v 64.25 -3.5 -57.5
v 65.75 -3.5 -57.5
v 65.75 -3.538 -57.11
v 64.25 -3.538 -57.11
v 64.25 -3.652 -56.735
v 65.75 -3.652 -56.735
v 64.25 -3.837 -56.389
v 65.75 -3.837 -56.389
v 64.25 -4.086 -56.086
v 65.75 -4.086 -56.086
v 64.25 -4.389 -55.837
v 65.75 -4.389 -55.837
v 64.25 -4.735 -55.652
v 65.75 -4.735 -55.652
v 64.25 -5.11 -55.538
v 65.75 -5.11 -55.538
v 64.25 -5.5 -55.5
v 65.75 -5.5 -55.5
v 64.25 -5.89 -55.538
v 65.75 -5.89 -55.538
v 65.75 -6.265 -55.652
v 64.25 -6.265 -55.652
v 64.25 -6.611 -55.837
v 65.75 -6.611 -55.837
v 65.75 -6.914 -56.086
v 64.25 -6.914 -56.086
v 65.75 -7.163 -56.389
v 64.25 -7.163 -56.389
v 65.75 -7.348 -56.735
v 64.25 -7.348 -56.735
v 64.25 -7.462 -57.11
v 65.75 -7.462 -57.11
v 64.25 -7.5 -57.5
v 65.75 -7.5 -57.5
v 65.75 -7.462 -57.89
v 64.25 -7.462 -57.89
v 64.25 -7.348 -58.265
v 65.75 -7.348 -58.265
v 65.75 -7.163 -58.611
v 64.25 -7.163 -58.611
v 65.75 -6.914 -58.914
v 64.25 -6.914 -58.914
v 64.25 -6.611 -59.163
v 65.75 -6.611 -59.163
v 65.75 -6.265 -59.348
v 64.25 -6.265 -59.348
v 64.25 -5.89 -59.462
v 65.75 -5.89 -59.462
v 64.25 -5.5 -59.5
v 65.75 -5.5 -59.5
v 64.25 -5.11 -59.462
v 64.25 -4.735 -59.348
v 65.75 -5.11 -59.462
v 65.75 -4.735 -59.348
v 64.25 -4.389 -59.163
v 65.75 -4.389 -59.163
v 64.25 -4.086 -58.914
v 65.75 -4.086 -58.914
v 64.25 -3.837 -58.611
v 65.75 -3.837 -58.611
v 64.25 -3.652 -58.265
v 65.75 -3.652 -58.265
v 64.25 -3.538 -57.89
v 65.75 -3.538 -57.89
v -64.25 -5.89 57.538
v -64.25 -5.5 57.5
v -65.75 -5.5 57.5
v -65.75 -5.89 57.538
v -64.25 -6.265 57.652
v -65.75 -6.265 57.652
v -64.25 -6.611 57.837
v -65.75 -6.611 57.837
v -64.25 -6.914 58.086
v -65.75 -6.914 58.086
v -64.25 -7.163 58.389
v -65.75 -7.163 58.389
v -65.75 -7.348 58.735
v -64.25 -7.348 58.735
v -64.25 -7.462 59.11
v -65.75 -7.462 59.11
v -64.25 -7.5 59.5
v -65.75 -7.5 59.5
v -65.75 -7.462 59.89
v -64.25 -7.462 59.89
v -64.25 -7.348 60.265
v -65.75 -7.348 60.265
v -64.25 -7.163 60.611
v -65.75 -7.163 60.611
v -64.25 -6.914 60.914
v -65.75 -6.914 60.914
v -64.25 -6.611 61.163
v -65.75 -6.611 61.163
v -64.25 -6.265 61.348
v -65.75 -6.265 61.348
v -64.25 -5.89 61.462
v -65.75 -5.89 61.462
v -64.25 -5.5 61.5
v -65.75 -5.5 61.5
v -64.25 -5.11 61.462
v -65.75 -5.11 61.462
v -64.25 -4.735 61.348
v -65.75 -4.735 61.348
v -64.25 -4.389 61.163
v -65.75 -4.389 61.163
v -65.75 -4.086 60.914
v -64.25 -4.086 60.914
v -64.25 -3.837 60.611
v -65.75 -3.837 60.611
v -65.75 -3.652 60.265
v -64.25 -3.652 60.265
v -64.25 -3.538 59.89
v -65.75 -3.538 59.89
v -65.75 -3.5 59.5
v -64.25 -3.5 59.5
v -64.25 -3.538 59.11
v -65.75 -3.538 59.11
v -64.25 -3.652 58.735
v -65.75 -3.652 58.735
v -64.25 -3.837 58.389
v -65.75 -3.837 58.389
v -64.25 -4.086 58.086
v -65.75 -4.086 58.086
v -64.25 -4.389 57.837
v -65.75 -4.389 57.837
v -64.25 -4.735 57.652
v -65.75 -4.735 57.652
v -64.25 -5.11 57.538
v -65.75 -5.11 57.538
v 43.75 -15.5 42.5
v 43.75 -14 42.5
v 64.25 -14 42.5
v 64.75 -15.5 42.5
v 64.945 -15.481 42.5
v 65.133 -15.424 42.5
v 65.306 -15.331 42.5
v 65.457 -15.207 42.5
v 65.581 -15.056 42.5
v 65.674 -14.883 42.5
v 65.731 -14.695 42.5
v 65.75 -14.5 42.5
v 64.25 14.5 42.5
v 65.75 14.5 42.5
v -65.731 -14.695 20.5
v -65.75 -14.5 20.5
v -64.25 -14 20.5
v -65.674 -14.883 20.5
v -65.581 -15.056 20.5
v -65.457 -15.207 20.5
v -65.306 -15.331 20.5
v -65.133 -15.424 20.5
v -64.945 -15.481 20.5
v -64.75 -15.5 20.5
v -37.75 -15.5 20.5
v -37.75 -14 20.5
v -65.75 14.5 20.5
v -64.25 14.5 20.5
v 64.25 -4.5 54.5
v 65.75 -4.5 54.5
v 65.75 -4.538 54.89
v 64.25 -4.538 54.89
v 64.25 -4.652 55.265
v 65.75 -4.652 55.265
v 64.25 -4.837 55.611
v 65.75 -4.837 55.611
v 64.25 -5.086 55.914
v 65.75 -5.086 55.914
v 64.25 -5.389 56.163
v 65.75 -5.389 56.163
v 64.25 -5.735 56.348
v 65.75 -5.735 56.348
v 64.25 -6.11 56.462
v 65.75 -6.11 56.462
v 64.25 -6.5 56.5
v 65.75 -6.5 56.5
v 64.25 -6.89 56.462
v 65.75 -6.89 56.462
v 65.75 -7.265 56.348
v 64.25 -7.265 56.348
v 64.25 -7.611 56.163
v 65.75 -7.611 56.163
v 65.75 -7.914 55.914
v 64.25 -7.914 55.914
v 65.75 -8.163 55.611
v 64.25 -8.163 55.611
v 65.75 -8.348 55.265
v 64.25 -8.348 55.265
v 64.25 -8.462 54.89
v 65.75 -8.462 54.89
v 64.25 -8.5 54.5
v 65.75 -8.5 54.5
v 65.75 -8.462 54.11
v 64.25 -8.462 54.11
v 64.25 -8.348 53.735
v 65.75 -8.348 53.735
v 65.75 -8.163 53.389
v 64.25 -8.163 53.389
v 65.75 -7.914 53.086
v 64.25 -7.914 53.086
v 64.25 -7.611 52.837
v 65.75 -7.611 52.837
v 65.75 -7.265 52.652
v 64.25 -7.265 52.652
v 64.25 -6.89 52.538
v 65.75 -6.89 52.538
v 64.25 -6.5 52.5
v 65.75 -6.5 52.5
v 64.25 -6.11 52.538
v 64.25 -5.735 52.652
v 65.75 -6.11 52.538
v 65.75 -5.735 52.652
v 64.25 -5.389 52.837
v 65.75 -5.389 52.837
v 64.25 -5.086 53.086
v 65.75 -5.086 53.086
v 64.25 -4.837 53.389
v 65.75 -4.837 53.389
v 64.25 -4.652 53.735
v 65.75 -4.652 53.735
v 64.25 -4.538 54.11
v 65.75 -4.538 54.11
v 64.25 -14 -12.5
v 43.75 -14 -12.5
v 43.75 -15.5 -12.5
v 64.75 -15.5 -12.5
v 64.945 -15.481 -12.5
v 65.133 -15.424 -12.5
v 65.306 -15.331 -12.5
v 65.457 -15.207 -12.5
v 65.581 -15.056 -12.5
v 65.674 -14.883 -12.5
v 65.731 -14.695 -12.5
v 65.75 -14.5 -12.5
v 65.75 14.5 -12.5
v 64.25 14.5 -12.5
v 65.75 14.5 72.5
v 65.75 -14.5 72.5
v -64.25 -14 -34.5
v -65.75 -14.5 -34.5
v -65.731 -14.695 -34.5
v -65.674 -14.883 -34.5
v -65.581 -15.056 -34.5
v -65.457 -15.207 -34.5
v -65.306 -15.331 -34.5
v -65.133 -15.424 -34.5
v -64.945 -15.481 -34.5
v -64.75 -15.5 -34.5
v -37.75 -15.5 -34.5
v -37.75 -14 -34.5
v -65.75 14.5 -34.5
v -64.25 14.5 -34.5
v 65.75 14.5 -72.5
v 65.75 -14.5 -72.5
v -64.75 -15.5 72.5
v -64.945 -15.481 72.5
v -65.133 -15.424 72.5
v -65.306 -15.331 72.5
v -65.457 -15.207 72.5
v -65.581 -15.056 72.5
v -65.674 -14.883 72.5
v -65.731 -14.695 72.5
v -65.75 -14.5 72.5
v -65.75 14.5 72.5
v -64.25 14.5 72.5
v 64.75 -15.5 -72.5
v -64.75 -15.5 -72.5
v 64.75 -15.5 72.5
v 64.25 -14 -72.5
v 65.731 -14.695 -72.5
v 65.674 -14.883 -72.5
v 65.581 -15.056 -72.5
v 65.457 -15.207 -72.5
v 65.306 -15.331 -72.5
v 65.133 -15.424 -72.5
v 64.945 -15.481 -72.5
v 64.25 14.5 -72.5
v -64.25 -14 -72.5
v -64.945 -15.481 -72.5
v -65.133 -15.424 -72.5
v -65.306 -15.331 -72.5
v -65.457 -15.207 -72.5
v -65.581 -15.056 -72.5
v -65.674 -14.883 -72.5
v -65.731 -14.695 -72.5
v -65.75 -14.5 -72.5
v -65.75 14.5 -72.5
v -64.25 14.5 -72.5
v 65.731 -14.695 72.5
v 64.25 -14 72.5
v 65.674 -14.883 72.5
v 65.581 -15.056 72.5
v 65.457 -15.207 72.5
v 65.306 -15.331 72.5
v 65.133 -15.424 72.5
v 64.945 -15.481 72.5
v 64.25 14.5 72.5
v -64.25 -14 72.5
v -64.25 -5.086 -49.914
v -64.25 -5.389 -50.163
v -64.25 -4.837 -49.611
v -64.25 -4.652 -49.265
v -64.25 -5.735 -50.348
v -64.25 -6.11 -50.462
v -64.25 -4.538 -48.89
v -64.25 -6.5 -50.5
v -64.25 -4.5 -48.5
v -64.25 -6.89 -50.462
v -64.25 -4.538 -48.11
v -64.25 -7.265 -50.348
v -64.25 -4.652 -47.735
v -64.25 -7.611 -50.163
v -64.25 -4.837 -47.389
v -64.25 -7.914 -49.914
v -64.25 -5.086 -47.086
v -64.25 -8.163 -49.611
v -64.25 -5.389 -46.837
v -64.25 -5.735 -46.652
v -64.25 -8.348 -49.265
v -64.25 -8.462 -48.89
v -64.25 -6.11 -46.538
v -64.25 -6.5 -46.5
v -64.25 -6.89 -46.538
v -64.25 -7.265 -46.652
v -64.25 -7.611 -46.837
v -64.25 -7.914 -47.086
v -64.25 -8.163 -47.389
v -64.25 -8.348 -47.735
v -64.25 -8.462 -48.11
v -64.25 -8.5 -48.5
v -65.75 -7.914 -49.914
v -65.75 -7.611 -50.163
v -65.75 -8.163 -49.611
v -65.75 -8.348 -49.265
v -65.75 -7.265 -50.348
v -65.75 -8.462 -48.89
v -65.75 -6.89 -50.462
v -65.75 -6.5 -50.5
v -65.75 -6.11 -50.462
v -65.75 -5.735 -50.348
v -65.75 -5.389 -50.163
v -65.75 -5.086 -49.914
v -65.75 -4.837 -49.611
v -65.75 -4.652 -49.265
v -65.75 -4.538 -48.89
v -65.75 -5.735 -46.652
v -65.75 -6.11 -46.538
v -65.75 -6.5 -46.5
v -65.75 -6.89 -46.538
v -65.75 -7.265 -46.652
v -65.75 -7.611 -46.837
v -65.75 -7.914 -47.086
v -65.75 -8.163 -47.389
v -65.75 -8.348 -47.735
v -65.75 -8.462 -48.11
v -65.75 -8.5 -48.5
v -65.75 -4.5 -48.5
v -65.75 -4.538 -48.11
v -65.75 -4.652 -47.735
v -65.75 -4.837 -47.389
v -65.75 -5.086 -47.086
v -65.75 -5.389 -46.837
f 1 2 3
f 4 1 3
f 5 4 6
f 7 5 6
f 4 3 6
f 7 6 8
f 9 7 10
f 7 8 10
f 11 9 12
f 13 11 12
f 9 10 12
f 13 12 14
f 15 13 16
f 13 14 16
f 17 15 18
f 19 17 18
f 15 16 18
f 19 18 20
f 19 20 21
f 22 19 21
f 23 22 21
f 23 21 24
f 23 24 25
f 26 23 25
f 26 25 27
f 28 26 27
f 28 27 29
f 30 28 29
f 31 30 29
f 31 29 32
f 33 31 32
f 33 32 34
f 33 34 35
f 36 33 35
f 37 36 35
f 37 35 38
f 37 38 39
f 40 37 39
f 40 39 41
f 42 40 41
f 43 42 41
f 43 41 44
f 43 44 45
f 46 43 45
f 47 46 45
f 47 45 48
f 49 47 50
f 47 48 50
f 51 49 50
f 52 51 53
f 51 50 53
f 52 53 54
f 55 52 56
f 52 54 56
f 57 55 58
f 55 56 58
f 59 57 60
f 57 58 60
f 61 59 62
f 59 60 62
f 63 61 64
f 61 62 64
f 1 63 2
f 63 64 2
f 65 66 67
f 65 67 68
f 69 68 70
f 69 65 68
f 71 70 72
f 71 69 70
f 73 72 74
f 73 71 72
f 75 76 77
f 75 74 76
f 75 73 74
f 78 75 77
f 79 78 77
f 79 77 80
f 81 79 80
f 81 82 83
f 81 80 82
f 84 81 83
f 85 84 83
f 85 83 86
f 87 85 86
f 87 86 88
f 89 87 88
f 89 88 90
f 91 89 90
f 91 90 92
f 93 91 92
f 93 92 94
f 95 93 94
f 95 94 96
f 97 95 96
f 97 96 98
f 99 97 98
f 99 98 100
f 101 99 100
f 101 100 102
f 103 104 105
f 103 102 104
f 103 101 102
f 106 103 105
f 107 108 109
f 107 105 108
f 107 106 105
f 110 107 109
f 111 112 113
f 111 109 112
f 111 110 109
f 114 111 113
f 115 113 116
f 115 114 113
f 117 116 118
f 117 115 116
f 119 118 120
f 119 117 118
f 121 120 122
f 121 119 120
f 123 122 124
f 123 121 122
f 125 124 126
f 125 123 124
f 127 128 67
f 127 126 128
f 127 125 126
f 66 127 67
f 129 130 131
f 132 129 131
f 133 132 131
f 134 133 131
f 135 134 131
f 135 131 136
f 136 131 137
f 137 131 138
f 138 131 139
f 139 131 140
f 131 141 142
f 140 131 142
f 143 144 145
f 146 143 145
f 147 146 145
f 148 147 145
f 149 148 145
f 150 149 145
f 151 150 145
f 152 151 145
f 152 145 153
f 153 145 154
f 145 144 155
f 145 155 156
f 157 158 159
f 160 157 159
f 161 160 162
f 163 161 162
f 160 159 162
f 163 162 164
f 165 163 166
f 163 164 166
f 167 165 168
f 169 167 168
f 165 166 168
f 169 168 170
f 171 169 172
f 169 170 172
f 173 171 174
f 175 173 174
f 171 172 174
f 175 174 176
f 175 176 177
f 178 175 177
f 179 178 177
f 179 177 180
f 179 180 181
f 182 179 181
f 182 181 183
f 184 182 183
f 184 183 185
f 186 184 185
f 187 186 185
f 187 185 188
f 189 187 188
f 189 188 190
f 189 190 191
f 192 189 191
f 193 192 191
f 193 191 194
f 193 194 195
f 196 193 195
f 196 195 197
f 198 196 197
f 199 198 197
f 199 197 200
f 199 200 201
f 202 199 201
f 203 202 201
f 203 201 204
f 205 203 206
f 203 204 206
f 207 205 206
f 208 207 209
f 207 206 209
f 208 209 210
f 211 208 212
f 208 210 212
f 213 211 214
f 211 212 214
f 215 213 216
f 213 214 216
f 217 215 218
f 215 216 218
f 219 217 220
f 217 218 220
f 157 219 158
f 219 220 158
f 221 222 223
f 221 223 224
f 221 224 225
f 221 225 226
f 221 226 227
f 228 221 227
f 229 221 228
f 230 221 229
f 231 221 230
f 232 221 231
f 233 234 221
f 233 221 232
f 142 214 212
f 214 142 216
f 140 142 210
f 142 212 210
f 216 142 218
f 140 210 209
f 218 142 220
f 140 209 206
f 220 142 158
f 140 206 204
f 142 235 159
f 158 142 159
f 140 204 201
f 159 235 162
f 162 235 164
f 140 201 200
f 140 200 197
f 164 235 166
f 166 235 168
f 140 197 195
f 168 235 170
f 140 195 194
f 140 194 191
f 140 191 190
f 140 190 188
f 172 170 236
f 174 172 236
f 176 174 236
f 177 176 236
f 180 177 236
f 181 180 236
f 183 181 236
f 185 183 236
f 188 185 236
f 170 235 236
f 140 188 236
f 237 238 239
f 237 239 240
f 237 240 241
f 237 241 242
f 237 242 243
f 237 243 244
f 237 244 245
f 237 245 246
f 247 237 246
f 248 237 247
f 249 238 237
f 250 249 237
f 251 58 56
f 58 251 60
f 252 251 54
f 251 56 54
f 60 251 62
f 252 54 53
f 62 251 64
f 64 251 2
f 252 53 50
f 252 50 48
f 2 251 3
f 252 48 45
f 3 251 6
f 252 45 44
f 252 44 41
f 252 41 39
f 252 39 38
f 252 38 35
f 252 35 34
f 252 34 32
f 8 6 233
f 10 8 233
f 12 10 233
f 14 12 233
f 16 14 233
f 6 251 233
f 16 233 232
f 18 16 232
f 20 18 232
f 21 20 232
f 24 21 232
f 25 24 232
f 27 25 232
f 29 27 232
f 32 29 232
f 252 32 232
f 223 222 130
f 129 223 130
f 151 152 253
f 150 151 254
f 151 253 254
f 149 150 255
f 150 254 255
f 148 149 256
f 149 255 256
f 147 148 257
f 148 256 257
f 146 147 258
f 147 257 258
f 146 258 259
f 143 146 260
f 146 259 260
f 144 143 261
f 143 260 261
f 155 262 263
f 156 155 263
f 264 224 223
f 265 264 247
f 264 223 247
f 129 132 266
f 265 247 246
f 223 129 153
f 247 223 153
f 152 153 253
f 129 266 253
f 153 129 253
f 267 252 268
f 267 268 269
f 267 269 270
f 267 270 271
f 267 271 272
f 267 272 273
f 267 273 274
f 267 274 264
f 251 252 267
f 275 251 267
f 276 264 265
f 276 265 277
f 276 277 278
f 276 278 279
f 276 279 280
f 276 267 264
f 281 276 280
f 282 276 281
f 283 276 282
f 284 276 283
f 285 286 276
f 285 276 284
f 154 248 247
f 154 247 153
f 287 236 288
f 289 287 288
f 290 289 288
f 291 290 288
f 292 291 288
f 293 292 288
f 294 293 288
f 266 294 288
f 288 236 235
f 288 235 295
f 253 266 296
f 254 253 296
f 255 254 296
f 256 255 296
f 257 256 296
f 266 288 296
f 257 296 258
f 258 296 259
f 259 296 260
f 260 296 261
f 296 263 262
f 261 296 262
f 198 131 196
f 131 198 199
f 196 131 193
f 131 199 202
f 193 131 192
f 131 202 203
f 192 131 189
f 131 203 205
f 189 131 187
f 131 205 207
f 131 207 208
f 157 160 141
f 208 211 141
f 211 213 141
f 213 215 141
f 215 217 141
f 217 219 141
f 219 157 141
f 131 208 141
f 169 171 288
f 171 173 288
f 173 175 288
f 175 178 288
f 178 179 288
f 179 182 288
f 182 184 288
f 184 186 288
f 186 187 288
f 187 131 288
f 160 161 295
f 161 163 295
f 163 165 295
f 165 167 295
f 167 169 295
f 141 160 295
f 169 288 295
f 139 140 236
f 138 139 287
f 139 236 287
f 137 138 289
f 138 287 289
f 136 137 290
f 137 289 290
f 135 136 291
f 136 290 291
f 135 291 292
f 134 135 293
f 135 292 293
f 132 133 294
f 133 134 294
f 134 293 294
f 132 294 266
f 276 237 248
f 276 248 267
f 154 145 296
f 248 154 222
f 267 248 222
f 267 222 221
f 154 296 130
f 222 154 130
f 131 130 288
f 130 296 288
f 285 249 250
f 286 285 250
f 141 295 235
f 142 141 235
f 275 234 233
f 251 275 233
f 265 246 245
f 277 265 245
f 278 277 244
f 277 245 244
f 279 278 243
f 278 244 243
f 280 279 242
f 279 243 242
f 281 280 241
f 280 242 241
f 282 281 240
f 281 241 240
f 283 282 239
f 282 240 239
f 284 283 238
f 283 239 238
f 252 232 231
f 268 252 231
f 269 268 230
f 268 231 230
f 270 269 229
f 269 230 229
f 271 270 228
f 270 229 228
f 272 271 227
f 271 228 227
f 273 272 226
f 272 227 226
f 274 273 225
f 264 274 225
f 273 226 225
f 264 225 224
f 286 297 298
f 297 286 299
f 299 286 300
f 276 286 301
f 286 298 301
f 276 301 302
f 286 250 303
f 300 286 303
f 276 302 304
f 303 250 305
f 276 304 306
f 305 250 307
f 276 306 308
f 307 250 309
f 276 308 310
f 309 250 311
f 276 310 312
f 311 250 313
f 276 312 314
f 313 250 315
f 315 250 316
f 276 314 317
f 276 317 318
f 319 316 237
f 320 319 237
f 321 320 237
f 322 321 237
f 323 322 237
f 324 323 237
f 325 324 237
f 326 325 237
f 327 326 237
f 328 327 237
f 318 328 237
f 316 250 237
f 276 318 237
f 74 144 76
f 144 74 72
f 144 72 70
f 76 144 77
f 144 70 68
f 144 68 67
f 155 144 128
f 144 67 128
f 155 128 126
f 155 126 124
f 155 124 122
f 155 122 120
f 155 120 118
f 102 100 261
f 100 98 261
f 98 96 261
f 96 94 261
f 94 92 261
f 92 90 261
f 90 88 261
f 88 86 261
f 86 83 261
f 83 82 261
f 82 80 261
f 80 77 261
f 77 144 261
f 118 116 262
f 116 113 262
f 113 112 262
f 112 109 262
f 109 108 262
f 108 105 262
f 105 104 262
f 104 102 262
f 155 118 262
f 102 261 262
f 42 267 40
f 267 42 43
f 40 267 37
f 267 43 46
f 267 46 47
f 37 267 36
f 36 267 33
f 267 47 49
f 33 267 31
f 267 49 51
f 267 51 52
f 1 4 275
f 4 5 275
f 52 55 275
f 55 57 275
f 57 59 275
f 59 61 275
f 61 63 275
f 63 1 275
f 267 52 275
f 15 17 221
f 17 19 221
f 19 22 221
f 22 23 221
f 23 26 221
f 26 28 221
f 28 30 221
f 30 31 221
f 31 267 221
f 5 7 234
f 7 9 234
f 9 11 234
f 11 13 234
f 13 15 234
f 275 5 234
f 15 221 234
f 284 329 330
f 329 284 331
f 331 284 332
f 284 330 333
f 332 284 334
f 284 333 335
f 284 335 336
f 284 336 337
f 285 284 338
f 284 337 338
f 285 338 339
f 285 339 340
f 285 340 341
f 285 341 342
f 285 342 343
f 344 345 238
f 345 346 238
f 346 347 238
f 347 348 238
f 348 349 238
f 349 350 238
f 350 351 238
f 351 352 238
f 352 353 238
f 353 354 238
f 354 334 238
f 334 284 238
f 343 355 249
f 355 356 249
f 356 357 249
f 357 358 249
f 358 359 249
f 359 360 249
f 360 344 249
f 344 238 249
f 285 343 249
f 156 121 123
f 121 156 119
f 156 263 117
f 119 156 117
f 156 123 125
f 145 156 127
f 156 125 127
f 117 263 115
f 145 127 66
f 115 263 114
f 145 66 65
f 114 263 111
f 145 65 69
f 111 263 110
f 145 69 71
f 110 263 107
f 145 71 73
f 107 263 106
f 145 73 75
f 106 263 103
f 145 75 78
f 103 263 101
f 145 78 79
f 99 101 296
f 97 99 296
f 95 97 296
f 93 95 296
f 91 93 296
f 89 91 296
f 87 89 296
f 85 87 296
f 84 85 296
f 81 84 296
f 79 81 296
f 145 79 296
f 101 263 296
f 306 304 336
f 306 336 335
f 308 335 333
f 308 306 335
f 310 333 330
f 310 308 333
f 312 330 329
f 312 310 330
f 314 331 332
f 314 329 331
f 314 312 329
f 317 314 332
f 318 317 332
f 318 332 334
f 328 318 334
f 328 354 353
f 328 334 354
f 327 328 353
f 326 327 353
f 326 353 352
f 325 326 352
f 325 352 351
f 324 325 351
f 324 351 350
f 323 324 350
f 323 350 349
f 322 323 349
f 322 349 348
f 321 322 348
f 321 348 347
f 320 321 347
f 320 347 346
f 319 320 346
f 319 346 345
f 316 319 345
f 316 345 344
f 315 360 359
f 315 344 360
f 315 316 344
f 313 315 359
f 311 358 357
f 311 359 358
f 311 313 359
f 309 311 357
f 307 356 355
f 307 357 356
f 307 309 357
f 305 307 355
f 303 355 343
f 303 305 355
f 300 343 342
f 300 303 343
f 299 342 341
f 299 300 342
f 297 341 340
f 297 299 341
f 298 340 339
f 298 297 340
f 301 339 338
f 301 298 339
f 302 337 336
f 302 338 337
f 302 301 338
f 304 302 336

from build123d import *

# Parameters (mm, degrees)
SALIENTE_EXTRUIR1_DEPTH    = 72.5
CORTAR_EXTRUIR1_DEPTH      = 31
CORTAR_EXTRUIR1_DEPTH_BACK = 140
CROQUIS2_W                 = 28
CROQUIS2_H                 = 55
CROQUIS2_W_2               = 22
CORTAR_EXTRUIR2_DEPTH      = 53
CORTAR_EXTRUIR2_DEPTH_BACK = 81
CROQUIS3_R                 = 2
CROQUIS5_R                 = 2
CORTAR_EXTRUIR3_DEPTH      = 81


with BuildPart() as part:
    # Croquis1 → Saliente-Extruir1 (new, symmetric)
    with BuildSketch(Plane.XY):
        with BuildLine():
            Line((-65.75, 14.5), (-64.25, 14.5))
            Line((-64.25, 14.5), (-64.25, -14))
            Line((-64.25, -14), (64.25, -14))
            Line((64.25, -14), (64.25, 14.5))
            Line((64.25, 14.5), (65.75, 14.5))
            Line((65.75, 14.5), (65.75, -14.5))
            ThreePointArc((65.75, -14.5), (65.457106781, -15.207106781), (64.75, -15.5))
            Line((64.75, -15.5), (-64.75, -15.5))
            ThreePointArc((-64.75, -15.5), (-65.457106781, -15.207106781), (-65.75, -14.5))
            Line((-65.75, -14.5), (-65.75, 14.5))
        make_face()
    extrude(amount=SALIENTE_EXTRUIR1_DEPTH, both=True)

    # Croquis2 → Cortar-Extruir1 (cut, two sides: drawn at the far end of the back side and taken through both)
    with BuildSketch(Plane.XZ.offset(15.5).offset(-CORTAR_EXTRUIR1_DEPTH_BACK)):
        with Locations((-51.75, -7)):
            Rectangle(CROQUIS2_W, CROQUIS2_H)
        with Locations((54.75, 15)):
            Rectangle(CROQUIS2_W_2, CROQUIS2_H)
    extrude(amount=CORTAR_EXTRUIR1_DEPTH + CORTAR_EXTRUIR1_DEPTH_BACK, mode=Mode.SUBTRACT)

    # Croquis3 → Cortar-Extruir2 (cut, two sides: drawn at the far end of the back side and taken through both)
    with BuildSketch(Plane.ZY.offset(65.75).offset(-CORTAR_EXTRUIR2_DEPTH_BACK)):
        with Locations(Location((59.5, -5.5, 0), (0, 0, 180))):
            Circle(CROQUIS3_R)
        with Locations(Location((-48.5, -6.5, 0), (0, 0, 180))):
            Circle(CROQUIS3_R)
    extrude(amount=CORTAR_EXTRUIR2_DEPTH + CORTAR_EXTRUIR2_DEPTH_BACK, mode=Mode.SUBTRACT)

    # Croquis5 → Cortar-Extruir3 (cut)
    with BuildSketch(Plane(origin=(65.75, 0, 0), x_dir=(0, 0, -1), z_dir=(1, 0, 0))):
        with Locations(Location((-54.5, -6.5, 0), (0, 0, 90))):
            Circle(CROQUIS5_R)
        with Locations(Location((57.5, -5.5, 0), (0, 0, 90))):
            Circle(CROQUIS5_R)
    extrude(amount=-CORTAR_EXTRUIR3_DEPTH, mode=Mode.SUBTRACT)


solid = part.part
